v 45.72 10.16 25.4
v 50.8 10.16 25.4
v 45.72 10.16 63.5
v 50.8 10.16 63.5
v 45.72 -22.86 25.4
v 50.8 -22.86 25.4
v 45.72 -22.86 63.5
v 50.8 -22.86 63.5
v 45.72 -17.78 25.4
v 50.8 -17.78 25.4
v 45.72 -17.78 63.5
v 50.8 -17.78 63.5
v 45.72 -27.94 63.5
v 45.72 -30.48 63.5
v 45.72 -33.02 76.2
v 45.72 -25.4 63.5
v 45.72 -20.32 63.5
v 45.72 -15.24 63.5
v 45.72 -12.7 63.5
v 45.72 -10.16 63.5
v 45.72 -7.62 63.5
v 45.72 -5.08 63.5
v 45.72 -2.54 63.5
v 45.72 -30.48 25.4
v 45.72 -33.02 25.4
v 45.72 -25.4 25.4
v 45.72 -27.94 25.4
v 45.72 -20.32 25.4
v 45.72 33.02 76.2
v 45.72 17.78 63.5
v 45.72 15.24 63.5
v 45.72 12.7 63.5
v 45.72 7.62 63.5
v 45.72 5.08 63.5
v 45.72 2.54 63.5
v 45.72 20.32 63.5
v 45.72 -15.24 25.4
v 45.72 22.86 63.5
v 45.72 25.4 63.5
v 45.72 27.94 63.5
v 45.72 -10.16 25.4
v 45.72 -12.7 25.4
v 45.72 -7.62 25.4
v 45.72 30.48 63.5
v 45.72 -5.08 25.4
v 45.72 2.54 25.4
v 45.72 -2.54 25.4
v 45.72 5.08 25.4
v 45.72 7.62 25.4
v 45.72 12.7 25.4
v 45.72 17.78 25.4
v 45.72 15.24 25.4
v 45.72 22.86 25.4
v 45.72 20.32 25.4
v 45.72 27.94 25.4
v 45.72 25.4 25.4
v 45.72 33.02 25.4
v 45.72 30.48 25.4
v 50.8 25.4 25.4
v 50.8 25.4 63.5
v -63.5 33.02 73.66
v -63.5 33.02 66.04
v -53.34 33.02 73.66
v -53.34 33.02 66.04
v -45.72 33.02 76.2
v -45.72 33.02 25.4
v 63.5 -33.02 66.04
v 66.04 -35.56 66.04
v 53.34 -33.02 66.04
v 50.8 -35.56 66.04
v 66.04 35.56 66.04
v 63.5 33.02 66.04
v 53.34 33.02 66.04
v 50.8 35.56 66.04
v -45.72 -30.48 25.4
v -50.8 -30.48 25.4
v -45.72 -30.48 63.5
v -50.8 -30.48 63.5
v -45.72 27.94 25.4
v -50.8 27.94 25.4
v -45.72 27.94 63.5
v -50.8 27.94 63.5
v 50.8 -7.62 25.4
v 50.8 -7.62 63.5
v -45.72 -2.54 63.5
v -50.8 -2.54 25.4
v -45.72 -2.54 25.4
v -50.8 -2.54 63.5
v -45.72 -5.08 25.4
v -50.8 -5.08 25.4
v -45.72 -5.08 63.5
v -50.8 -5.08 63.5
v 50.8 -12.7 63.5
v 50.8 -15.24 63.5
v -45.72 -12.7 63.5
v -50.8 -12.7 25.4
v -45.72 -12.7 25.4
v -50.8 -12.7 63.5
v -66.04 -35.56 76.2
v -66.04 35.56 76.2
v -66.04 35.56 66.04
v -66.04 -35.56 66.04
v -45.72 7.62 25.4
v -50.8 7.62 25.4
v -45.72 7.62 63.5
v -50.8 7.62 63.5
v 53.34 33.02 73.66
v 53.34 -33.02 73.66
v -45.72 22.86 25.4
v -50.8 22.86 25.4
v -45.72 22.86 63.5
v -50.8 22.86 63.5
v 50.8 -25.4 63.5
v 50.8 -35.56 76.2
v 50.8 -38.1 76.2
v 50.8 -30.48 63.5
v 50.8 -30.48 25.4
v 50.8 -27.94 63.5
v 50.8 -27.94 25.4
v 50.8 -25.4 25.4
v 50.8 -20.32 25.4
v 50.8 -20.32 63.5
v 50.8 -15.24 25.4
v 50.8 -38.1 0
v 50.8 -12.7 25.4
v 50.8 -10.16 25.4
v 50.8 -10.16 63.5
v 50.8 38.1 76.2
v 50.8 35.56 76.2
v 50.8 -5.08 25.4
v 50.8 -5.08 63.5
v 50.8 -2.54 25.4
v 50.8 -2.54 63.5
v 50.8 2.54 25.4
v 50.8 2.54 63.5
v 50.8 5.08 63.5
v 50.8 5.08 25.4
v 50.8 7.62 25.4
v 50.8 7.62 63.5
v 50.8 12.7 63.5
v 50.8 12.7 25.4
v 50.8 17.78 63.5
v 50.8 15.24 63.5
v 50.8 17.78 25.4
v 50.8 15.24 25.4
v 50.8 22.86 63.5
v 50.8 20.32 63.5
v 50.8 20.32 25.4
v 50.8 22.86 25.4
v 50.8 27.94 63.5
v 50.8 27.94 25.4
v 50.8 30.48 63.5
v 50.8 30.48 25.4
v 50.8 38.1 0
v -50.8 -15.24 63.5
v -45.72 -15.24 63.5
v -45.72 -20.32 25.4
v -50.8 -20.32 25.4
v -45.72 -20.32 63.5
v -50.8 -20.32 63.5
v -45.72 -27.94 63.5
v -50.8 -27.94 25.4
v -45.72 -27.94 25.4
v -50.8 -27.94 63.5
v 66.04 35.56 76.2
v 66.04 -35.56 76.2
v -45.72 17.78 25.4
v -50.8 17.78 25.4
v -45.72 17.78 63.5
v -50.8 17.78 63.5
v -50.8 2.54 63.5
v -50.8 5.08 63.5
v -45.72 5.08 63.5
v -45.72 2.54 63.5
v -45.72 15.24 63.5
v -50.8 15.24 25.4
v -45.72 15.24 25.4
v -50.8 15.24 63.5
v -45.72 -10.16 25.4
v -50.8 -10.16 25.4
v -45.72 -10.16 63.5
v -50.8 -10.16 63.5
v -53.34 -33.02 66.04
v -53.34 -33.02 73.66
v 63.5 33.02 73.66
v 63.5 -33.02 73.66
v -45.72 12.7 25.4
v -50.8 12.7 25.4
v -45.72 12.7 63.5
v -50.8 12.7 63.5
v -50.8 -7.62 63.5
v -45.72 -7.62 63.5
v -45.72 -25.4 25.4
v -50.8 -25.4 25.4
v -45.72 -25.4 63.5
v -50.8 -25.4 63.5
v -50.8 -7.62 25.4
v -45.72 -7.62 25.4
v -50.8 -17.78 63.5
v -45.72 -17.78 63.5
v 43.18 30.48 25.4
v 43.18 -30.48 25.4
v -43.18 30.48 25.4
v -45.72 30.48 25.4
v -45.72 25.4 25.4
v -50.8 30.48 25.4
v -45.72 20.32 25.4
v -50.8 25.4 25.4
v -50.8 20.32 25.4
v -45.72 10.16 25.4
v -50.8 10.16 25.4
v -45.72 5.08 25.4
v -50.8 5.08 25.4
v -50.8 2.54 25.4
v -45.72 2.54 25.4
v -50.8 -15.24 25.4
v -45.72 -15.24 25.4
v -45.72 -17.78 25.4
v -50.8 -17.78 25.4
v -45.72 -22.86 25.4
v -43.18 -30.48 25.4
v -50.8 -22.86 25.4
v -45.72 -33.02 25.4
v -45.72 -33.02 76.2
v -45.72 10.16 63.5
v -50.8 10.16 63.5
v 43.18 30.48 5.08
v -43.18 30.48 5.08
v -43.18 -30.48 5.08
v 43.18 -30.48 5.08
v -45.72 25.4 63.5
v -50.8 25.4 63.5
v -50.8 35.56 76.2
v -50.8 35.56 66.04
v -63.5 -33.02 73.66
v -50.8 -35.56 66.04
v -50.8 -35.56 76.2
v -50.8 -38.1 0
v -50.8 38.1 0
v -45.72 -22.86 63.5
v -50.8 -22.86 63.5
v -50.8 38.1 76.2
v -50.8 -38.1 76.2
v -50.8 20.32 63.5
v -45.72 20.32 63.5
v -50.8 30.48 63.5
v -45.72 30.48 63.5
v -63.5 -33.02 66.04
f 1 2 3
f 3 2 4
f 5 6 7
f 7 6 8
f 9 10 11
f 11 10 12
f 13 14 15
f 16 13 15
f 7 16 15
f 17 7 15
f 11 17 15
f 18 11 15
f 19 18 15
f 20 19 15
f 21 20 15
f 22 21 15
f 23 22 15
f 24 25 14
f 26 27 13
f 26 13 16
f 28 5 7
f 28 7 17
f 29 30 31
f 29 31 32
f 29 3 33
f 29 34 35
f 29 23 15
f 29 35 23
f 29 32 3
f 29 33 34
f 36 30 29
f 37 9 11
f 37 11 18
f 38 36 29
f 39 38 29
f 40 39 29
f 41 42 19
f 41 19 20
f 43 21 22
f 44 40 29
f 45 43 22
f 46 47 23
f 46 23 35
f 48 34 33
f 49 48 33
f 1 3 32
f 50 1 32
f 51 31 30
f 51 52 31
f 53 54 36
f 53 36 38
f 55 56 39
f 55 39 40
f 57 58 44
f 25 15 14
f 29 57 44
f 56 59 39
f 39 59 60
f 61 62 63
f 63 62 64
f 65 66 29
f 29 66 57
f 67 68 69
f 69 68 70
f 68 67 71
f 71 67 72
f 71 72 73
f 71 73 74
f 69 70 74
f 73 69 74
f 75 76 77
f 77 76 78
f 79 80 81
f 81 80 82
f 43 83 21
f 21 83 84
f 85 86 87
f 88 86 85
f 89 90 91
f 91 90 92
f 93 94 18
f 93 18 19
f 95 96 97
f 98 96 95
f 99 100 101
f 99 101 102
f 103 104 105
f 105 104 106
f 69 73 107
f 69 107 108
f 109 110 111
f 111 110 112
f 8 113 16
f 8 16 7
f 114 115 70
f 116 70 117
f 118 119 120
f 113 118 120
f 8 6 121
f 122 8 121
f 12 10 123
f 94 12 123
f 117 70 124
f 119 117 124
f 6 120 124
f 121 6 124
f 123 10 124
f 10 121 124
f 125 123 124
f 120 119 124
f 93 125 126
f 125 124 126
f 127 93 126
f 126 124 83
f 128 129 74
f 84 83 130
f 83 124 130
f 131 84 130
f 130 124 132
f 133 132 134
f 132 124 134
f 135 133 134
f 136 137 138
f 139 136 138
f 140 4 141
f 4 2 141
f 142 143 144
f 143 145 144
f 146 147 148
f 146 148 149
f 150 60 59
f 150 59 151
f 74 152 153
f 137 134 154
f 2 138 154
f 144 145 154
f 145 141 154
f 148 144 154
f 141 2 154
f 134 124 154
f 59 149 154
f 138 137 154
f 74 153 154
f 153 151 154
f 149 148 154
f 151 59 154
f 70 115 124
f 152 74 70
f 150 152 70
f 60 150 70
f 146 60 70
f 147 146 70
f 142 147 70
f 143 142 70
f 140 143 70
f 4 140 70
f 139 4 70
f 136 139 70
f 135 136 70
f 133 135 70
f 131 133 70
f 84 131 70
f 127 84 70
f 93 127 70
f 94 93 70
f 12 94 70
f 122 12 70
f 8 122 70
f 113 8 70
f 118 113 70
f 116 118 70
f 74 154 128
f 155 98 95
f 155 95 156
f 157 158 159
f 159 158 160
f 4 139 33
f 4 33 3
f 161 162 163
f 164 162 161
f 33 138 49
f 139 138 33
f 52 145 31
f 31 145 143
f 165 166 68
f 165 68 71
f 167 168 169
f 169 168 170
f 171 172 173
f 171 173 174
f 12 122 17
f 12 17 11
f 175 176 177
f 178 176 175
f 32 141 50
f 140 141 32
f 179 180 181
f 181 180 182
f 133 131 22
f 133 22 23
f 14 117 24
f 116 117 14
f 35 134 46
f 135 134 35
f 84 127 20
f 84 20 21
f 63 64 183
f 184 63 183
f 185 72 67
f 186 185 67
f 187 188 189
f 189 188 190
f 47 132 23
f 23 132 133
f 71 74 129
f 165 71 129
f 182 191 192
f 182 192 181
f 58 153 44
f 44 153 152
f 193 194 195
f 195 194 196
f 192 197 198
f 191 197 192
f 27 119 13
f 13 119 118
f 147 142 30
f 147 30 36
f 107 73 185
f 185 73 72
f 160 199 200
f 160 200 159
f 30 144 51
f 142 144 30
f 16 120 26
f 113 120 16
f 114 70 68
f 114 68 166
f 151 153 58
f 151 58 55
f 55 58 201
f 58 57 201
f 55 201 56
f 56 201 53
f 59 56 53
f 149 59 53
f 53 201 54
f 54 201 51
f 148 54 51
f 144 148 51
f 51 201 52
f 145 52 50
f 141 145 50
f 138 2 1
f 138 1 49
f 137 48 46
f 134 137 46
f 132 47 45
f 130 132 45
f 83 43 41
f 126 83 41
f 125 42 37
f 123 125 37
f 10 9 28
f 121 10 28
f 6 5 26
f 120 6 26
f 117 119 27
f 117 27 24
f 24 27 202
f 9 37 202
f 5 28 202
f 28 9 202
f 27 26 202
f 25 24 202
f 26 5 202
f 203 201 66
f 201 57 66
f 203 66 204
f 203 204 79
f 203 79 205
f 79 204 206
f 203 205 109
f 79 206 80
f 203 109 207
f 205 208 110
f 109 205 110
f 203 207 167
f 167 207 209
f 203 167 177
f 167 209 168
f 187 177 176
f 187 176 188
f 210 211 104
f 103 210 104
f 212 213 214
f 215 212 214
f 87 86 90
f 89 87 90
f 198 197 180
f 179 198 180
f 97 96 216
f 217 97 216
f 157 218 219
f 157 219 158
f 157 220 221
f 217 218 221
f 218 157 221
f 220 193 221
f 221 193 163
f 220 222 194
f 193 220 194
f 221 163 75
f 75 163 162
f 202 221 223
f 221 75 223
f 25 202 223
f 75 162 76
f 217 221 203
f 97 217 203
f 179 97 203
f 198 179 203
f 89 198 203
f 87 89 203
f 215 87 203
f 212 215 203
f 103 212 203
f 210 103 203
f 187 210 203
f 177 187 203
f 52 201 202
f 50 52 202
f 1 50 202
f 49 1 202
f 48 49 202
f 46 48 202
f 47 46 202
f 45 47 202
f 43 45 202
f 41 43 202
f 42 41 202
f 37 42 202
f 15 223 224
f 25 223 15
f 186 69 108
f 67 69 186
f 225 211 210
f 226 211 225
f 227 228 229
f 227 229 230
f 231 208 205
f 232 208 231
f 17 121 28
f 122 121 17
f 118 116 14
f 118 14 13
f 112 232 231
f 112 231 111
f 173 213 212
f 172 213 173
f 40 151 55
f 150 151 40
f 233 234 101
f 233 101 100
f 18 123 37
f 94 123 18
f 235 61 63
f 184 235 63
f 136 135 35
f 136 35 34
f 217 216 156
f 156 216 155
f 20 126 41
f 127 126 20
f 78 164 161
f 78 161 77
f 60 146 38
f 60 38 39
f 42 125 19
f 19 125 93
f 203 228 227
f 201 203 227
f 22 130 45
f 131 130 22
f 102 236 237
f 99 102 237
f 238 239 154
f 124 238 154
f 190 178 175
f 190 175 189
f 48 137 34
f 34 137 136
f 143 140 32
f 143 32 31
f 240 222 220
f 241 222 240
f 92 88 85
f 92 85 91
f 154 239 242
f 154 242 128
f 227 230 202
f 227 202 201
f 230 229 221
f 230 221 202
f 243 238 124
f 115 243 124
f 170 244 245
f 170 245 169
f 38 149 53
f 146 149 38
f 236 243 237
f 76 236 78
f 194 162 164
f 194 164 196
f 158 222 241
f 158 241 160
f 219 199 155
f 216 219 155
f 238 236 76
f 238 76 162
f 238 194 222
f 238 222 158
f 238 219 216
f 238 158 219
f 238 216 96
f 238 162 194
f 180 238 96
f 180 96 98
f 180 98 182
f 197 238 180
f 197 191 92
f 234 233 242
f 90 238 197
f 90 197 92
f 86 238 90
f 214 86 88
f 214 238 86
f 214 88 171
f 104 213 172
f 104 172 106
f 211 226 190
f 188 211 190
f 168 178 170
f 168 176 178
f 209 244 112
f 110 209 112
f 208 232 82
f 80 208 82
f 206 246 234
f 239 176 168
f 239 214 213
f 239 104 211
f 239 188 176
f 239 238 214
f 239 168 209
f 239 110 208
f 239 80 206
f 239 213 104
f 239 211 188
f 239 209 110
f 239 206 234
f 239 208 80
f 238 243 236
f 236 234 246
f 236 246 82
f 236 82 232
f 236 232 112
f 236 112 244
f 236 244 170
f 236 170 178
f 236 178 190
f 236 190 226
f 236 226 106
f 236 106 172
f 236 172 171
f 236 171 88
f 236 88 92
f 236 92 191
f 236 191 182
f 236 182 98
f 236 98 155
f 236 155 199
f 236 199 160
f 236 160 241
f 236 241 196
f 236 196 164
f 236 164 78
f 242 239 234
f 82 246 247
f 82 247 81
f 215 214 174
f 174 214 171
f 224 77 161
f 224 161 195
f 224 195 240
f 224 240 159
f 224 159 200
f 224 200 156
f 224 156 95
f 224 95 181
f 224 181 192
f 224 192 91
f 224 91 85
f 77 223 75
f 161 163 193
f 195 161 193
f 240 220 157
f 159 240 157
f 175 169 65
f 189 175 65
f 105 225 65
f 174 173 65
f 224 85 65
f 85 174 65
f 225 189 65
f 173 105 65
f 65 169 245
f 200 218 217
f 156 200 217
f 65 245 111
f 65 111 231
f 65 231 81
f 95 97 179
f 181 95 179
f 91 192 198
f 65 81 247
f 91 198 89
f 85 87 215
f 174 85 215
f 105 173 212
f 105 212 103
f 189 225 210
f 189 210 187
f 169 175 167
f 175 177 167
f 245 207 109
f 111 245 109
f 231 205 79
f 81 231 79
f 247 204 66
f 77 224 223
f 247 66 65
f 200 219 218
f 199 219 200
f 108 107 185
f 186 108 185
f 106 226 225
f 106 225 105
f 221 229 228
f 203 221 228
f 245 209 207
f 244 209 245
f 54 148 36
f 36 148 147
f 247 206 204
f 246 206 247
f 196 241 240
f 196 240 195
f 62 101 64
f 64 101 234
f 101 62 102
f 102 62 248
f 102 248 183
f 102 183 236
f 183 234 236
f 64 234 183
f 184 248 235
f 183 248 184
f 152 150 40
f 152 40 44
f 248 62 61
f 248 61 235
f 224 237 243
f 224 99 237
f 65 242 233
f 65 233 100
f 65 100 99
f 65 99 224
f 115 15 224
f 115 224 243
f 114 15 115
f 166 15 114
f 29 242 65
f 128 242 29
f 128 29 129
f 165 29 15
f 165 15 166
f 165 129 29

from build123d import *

# Parameters (mm, degrees)
F0_W      = 91.44
F0_H      = 66.04
F0_W_2    = 86.36
F0_H_2    = 60.96
F1_DEPTH  = 25.4
F0_W_3    = 101.6
F0_H_3    = 76.2
F2_DEPTH  = 76.2
F3_W      = 2.54
F3_H      = 38.1
F4_DEPTH  = 5.08
F5_DEPTH  = 5.08
F6_W      = 2.54
F6_H      = 38.1
F7_DEPTH  = 5.08
F8_W      = 71.12
F8_H      = 10.16
F9_DEPTH  = 15.24
F10_W     = 71.12
F10_H     = 10.16
F11_DEPTH = 15.24
F12_W     = 10.16
F12_H     = 66.04
F13_DEPTH = 7.62


with BuildPart() as f1:
    # F0 (on Top) → F1 (new body)
    with BuildSketch(Plane.XY):
        Rectangle(F0_W, F0_H)
        Rectangle(F0_W_2, F0_H_2, mode=Mode.SUBTRACT)
    extrude(amount=F1_DEPTH)

    # F0 (on Top) → F2 (join)
    with BuildSketch(Plane.XY):
        Rectangle(F0_W_3, F0_H_3)
        Rectangle(F0_W, F0_H, mode=Mode.SUBTRACT)
    extrude(amount=F2_DEPTH)

    # F3 (on face) → F4 (cut)
    with BuildSketch(Plane.YZ.offset(50.8)):
        with Locations((-29.21, 44.45)):
            Rectangle(F3_W, F3_H)
        with Locations((-24.13, 44.45)):
            Rectangle(F3_W, F3_H)
        with Locations((-19.05, 44.45)):
            Rectangle(F3_W, F3_H)
        with Locations((-13.97, 44.45)):
            Rectangle(F3_W, F3_H)
        with Locations((-8.89, 44.45)):
            Rectangle(F3_W, F3_H)
        with Locations((-3.81, 44.45)):
            Rectangle(F3_W, F3_H)
        with Locations((3.81, 44.45)):
            Rectangle(F3_W, F3_H)
        with Locations((8.89, 44.45)):
            Rectangle(F3_W, F3_H)
        with Locations((13.97, 44.45)):
            Rectangle(F3_W, F3_H)
        with Locations((19.05, 44.45)):
            Rectangle(F3_W, F3_H)
        with Locations((24.13, 44.45)):
            Rectangle(F3_W, F3_H)
        with Locations((29.21, 44.45)):
            Rectangle(F3_W, F3_H)
    extrude(amount=-F4_DEPTH, mode=Mode.SUBTRACT)

    # F0 (on Top) → F5 (join)
    with BuildSketch(Plane.XY):
        Rectangle(F0_W_2, F0_H_2)
    extrude(amount=F5_DEPTH)

    # F6 (on face) → F7 (cut)
    with BuildSketch(Plane(origin=(-50.8, 0, 0), x_dir=(0, -1, 0), z_dir=(-1, 0, 0))):
        with Locations((-3.81, 44.45)):
            Rectangle(F6_W, F6_H)
        with Locations((3.81, 44.45)):
            Rectangle(F6_W, F6_H)
        with Locations((8.89, 44.45)):
            Rectangle(F6_W, F6_H)
        with Locations((13.97, 44.45)):
            Rectangle(F6_W, F6_H)
        with Locations((-8.89, 44.45)):
            Rectangle(F6_W, F6_H)
        with Locations((-13.97, 44.45)):
            Rectangle(F6_W, F6_H)
        with Locations((19.05, 44.45)):
            Rectangle(F6_W, F6_H)
        with Locations((24.13, 44.45)):
            Rectangle(F6_W, F6_H)
        with Locations((29.21, 44.45)):
            Rectangle(F6_W, F6_H)
        with Locations((-19.05, 44.45)):
            Rectangle(F6_W, F6_H)
        with Locations((-24.13, 44.45)):
            Rectangle(F6_W, F6_H)
        with Locations((-29.21, 44.45)):
            Rectangle(F6_W, F6_H)
    extrude(amount=-F7_DEPTH, mode=Mode.SUBTRACT)

    # F8 (on face) → F9 (join)
    with BuildSketch(Plane(origin=(-50.8, 0, 0), x_dir=(0, -1, 0), z_dir=(-1, 0, 0))):
        with Locations((0, 71.12)):
            Rectangle(F8_W, F8_H)
    extrude(amount=F9_DEPTH)

    # F10 (on face) → F11 (join)
    with BuildSketch(Plane.YZ.offset(50.8)):
        with Locations((0, 71.12)):
            Rectangle(F10_W, F10_H)
    extrude(amount=F11_DEPTH)

    # F12 (on face) → F13 (cut)
    with BuildSketch(Plane(origin=(0, 0, 66.04), x_dir=(1, 0, 0), z_dir=(0, 0, -1))):
        with Locations((58.42, 0)):
            Rectangle(F12_W, F12_H)
        with Locations((-58.42, 0)):
            Rectangle(F12_W, F12_H)
    extrude(amount=-F13_DEPTH, mode=Mode.SUBTRACT)


solid = f1.part
